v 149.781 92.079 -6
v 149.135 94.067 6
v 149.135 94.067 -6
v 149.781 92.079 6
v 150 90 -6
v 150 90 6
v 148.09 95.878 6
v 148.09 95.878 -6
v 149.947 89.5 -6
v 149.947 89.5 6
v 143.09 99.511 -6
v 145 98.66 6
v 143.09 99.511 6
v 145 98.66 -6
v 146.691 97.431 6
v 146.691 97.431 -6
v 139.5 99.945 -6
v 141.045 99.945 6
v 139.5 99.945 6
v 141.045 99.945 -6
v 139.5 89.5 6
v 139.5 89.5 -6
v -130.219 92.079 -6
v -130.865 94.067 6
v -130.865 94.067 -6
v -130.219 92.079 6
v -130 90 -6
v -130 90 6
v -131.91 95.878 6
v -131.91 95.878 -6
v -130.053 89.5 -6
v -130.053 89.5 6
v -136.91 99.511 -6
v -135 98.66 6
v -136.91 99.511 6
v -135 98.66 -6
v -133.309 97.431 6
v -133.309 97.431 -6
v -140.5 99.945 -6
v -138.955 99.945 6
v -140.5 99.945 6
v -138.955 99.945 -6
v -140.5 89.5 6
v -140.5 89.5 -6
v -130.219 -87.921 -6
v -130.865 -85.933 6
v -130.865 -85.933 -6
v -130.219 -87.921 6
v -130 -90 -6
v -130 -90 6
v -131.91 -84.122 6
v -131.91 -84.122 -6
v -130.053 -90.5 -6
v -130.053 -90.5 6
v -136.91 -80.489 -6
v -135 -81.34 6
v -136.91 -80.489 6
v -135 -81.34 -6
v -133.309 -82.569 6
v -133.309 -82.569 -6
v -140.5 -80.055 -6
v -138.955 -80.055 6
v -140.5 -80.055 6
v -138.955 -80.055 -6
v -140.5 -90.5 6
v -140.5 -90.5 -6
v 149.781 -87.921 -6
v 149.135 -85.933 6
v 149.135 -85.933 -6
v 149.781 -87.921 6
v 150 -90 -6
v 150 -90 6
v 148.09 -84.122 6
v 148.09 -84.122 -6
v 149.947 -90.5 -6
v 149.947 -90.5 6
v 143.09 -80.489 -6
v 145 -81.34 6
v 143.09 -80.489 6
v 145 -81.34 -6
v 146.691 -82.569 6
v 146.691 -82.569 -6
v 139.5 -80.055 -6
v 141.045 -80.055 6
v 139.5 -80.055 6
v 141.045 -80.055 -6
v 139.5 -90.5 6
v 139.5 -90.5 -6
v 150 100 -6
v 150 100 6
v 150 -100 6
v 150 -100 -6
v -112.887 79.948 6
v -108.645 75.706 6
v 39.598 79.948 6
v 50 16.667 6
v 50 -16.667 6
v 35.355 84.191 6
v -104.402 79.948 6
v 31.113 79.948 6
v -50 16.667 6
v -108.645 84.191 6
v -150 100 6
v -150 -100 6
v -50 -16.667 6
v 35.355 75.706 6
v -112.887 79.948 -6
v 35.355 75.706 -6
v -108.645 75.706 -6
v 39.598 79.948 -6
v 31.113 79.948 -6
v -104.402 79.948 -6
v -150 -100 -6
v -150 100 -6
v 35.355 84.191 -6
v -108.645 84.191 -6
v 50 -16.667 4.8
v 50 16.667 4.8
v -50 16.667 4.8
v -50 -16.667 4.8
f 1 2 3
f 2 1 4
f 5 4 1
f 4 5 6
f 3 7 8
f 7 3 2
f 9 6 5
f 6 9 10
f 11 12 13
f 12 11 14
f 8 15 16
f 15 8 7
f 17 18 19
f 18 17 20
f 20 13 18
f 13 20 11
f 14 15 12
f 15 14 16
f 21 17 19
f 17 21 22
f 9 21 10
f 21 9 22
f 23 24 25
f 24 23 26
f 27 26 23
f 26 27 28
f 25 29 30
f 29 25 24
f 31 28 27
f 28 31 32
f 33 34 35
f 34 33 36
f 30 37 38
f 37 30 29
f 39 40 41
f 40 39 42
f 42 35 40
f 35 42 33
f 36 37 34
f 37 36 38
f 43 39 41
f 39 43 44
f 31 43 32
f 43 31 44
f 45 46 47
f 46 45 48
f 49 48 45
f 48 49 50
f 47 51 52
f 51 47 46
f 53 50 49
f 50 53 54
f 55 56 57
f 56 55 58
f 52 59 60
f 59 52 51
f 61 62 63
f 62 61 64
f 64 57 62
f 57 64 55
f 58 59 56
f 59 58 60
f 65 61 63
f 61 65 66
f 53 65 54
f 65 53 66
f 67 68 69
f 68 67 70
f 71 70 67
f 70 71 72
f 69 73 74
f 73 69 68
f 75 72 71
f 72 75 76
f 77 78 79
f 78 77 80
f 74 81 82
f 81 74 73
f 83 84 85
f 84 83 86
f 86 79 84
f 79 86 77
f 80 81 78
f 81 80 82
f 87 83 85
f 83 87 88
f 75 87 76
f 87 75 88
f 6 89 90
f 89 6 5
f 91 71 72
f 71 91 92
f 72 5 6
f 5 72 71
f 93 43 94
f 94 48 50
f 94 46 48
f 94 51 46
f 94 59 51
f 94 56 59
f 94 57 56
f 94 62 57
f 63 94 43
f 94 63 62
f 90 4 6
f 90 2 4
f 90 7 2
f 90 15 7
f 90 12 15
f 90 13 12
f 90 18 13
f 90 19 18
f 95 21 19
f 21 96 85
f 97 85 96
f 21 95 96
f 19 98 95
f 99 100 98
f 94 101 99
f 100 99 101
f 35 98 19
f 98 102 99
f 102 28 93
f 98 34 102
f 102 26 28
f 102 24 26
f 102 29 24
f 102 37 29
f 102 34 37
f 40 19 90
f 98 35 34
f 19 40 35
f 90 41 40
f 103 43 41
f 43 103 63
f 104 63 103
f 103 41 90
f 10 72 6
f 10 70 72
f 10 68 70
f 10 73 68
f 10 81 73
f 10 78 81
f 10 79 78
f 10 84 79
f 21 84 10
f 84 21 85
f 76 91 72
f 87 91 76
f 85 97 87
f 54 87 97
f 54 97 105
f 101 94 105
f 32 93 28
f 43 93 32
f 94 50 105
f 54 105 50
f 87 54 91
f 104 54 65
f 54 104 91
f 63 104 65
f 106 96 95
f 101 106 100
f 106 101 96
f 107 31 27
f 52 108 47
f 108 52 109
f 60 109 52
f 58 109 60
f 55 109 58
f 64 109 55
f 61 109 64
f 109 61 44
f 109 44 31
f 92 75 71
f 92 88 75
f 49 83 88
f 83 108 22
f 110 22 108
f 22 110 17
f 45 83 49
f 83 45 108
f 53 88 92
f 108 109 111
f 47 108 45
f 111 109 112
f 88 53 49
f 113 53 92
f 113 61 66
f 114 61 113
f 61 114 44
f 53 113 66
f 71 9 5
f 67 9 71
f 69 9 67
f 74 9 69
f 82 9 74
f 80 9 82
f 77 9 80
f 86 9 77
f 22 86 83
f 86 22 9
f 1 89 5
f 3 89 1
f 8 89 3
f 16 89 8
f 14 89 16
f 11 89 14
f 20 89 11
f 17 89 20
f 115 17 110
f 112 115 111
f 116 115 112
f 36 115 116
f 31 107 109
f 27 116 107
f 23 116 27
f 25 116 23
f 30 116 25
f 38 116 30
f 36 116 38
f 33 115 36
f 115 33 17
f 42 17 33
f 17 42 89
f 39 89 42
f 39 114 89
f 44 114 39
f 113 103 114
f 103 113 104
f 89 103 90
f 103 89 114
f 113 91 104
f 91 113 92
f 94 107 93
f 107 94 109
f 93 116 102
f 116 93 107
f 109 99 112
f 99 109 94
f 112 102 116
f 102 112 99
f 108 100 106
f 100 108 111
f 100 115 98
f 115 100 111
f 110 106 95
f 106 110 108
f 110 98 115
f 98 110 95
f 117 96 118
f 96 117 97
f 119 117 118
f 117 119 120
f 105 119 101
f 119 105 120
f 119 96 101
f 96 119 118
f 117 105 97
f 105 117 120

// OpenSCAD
// Parameters
plate_length = 300; //[150:600:1]
plate_width = 200; //[100:400:1]
plate_thickness = 12; //[6:24:1]
corner_radius = 10; //[5:20:1]
chamfer_leg = 6; //[3:12:1]
overlap = 1; //[0.5:2:0.5]

// Base Shapes
module tooling_plate_body() {
  cube([plate_length, plate_width, plate_thickness], center=true);
}

module rounded_corner_cutter_cyl() {
  cylinder(r=corner_radius, h=plate_thickness + 2*overlap, center=true);
}

module rounded_corner_cutter_box() {
  cube([corner_radius + overlap, corner_radius + overlap, plate_thickness + 2*overlap], center=true);
}

module chamfer_corner_cut_box() {
  cube([chamfer_leg, chamfer_leg, plate_thickness + 2*overlap], center=true);
}

module engraved_label() {
  cube([plate_length/3, plate_width/6, plate_thickness/10], center=true);
}

// Operations
module rounded_corner_cutter_quadrant() {
  intersection() {
    rounded_corner_cutter_cyl();
    translate([corner_radius/2, corner_radius/2, 0]) rounded_corner_cutter_box();
  }
}

module rounded_corners() {
  union() {
    translate([plate_length/2 - corner_radius, plate_width/2 - corner_radius, 0]) rounded_corner_cutter_quadrant();
    translate([-(plate_length/2 - corner_radius), plate_width/2 - corner_radius, 0]) rounded_corner_cutter_quadrant();
    translate([-(plate_length/2 - corner_radius), -(plate_width/2 - corner_radius), 0]) rounded_corner_cutter_quadrant();
    translate([plate_length/2 - corner_radius, -(plate_width/2 - corner_radius), 0]) rounded_corner_cutter_quadrant();
  }
}

module chamfer_corner_cut() {
  intersection() {
    rotate([0, 0, 45]) translate([plate_length/2 - chamfer_leg/2 + overlap, plate_width/2 - chamfer_leg/2 + overlap, 0]) chamfer_corner_cut_box();
    rotate([0, 0, 45]) translate([plate_length/2 - chamfer_leg/2 + overlap, plate_width/2 - chamfer_leg/2 + overlap, 0]) chamfer_corner_cut_box();
  }
}

module corner_chamfers() {
  union() {
    chamfer_corner_cut();
    translate([-(plate_length - 2*chamfer_leg)/2, 0, 0]) chamfer_corner_cut();
    translate([-(plate_length - 2*chamfer_leg)/2, -(plate_width - 2*chamfer_leg)/2, 0]) chamfer_corner_cut();
    translate([0, -(plate_width - 2*chamfer_leg)/2, 0]) chamfer_corner_cut();
  }
}

// Final Model
module complete_model() {
  difference() {
    difference() {
      difference() {
        tooling_plate_body();
        rounded_corners();
      }
      corner_chamfers();
    }
    translate([0, 0, plate_thickness/2 - (plate_thickness/10)/2]) engraved_label();
  }
}

// Render the complete model
color("Silver") complete_model();
